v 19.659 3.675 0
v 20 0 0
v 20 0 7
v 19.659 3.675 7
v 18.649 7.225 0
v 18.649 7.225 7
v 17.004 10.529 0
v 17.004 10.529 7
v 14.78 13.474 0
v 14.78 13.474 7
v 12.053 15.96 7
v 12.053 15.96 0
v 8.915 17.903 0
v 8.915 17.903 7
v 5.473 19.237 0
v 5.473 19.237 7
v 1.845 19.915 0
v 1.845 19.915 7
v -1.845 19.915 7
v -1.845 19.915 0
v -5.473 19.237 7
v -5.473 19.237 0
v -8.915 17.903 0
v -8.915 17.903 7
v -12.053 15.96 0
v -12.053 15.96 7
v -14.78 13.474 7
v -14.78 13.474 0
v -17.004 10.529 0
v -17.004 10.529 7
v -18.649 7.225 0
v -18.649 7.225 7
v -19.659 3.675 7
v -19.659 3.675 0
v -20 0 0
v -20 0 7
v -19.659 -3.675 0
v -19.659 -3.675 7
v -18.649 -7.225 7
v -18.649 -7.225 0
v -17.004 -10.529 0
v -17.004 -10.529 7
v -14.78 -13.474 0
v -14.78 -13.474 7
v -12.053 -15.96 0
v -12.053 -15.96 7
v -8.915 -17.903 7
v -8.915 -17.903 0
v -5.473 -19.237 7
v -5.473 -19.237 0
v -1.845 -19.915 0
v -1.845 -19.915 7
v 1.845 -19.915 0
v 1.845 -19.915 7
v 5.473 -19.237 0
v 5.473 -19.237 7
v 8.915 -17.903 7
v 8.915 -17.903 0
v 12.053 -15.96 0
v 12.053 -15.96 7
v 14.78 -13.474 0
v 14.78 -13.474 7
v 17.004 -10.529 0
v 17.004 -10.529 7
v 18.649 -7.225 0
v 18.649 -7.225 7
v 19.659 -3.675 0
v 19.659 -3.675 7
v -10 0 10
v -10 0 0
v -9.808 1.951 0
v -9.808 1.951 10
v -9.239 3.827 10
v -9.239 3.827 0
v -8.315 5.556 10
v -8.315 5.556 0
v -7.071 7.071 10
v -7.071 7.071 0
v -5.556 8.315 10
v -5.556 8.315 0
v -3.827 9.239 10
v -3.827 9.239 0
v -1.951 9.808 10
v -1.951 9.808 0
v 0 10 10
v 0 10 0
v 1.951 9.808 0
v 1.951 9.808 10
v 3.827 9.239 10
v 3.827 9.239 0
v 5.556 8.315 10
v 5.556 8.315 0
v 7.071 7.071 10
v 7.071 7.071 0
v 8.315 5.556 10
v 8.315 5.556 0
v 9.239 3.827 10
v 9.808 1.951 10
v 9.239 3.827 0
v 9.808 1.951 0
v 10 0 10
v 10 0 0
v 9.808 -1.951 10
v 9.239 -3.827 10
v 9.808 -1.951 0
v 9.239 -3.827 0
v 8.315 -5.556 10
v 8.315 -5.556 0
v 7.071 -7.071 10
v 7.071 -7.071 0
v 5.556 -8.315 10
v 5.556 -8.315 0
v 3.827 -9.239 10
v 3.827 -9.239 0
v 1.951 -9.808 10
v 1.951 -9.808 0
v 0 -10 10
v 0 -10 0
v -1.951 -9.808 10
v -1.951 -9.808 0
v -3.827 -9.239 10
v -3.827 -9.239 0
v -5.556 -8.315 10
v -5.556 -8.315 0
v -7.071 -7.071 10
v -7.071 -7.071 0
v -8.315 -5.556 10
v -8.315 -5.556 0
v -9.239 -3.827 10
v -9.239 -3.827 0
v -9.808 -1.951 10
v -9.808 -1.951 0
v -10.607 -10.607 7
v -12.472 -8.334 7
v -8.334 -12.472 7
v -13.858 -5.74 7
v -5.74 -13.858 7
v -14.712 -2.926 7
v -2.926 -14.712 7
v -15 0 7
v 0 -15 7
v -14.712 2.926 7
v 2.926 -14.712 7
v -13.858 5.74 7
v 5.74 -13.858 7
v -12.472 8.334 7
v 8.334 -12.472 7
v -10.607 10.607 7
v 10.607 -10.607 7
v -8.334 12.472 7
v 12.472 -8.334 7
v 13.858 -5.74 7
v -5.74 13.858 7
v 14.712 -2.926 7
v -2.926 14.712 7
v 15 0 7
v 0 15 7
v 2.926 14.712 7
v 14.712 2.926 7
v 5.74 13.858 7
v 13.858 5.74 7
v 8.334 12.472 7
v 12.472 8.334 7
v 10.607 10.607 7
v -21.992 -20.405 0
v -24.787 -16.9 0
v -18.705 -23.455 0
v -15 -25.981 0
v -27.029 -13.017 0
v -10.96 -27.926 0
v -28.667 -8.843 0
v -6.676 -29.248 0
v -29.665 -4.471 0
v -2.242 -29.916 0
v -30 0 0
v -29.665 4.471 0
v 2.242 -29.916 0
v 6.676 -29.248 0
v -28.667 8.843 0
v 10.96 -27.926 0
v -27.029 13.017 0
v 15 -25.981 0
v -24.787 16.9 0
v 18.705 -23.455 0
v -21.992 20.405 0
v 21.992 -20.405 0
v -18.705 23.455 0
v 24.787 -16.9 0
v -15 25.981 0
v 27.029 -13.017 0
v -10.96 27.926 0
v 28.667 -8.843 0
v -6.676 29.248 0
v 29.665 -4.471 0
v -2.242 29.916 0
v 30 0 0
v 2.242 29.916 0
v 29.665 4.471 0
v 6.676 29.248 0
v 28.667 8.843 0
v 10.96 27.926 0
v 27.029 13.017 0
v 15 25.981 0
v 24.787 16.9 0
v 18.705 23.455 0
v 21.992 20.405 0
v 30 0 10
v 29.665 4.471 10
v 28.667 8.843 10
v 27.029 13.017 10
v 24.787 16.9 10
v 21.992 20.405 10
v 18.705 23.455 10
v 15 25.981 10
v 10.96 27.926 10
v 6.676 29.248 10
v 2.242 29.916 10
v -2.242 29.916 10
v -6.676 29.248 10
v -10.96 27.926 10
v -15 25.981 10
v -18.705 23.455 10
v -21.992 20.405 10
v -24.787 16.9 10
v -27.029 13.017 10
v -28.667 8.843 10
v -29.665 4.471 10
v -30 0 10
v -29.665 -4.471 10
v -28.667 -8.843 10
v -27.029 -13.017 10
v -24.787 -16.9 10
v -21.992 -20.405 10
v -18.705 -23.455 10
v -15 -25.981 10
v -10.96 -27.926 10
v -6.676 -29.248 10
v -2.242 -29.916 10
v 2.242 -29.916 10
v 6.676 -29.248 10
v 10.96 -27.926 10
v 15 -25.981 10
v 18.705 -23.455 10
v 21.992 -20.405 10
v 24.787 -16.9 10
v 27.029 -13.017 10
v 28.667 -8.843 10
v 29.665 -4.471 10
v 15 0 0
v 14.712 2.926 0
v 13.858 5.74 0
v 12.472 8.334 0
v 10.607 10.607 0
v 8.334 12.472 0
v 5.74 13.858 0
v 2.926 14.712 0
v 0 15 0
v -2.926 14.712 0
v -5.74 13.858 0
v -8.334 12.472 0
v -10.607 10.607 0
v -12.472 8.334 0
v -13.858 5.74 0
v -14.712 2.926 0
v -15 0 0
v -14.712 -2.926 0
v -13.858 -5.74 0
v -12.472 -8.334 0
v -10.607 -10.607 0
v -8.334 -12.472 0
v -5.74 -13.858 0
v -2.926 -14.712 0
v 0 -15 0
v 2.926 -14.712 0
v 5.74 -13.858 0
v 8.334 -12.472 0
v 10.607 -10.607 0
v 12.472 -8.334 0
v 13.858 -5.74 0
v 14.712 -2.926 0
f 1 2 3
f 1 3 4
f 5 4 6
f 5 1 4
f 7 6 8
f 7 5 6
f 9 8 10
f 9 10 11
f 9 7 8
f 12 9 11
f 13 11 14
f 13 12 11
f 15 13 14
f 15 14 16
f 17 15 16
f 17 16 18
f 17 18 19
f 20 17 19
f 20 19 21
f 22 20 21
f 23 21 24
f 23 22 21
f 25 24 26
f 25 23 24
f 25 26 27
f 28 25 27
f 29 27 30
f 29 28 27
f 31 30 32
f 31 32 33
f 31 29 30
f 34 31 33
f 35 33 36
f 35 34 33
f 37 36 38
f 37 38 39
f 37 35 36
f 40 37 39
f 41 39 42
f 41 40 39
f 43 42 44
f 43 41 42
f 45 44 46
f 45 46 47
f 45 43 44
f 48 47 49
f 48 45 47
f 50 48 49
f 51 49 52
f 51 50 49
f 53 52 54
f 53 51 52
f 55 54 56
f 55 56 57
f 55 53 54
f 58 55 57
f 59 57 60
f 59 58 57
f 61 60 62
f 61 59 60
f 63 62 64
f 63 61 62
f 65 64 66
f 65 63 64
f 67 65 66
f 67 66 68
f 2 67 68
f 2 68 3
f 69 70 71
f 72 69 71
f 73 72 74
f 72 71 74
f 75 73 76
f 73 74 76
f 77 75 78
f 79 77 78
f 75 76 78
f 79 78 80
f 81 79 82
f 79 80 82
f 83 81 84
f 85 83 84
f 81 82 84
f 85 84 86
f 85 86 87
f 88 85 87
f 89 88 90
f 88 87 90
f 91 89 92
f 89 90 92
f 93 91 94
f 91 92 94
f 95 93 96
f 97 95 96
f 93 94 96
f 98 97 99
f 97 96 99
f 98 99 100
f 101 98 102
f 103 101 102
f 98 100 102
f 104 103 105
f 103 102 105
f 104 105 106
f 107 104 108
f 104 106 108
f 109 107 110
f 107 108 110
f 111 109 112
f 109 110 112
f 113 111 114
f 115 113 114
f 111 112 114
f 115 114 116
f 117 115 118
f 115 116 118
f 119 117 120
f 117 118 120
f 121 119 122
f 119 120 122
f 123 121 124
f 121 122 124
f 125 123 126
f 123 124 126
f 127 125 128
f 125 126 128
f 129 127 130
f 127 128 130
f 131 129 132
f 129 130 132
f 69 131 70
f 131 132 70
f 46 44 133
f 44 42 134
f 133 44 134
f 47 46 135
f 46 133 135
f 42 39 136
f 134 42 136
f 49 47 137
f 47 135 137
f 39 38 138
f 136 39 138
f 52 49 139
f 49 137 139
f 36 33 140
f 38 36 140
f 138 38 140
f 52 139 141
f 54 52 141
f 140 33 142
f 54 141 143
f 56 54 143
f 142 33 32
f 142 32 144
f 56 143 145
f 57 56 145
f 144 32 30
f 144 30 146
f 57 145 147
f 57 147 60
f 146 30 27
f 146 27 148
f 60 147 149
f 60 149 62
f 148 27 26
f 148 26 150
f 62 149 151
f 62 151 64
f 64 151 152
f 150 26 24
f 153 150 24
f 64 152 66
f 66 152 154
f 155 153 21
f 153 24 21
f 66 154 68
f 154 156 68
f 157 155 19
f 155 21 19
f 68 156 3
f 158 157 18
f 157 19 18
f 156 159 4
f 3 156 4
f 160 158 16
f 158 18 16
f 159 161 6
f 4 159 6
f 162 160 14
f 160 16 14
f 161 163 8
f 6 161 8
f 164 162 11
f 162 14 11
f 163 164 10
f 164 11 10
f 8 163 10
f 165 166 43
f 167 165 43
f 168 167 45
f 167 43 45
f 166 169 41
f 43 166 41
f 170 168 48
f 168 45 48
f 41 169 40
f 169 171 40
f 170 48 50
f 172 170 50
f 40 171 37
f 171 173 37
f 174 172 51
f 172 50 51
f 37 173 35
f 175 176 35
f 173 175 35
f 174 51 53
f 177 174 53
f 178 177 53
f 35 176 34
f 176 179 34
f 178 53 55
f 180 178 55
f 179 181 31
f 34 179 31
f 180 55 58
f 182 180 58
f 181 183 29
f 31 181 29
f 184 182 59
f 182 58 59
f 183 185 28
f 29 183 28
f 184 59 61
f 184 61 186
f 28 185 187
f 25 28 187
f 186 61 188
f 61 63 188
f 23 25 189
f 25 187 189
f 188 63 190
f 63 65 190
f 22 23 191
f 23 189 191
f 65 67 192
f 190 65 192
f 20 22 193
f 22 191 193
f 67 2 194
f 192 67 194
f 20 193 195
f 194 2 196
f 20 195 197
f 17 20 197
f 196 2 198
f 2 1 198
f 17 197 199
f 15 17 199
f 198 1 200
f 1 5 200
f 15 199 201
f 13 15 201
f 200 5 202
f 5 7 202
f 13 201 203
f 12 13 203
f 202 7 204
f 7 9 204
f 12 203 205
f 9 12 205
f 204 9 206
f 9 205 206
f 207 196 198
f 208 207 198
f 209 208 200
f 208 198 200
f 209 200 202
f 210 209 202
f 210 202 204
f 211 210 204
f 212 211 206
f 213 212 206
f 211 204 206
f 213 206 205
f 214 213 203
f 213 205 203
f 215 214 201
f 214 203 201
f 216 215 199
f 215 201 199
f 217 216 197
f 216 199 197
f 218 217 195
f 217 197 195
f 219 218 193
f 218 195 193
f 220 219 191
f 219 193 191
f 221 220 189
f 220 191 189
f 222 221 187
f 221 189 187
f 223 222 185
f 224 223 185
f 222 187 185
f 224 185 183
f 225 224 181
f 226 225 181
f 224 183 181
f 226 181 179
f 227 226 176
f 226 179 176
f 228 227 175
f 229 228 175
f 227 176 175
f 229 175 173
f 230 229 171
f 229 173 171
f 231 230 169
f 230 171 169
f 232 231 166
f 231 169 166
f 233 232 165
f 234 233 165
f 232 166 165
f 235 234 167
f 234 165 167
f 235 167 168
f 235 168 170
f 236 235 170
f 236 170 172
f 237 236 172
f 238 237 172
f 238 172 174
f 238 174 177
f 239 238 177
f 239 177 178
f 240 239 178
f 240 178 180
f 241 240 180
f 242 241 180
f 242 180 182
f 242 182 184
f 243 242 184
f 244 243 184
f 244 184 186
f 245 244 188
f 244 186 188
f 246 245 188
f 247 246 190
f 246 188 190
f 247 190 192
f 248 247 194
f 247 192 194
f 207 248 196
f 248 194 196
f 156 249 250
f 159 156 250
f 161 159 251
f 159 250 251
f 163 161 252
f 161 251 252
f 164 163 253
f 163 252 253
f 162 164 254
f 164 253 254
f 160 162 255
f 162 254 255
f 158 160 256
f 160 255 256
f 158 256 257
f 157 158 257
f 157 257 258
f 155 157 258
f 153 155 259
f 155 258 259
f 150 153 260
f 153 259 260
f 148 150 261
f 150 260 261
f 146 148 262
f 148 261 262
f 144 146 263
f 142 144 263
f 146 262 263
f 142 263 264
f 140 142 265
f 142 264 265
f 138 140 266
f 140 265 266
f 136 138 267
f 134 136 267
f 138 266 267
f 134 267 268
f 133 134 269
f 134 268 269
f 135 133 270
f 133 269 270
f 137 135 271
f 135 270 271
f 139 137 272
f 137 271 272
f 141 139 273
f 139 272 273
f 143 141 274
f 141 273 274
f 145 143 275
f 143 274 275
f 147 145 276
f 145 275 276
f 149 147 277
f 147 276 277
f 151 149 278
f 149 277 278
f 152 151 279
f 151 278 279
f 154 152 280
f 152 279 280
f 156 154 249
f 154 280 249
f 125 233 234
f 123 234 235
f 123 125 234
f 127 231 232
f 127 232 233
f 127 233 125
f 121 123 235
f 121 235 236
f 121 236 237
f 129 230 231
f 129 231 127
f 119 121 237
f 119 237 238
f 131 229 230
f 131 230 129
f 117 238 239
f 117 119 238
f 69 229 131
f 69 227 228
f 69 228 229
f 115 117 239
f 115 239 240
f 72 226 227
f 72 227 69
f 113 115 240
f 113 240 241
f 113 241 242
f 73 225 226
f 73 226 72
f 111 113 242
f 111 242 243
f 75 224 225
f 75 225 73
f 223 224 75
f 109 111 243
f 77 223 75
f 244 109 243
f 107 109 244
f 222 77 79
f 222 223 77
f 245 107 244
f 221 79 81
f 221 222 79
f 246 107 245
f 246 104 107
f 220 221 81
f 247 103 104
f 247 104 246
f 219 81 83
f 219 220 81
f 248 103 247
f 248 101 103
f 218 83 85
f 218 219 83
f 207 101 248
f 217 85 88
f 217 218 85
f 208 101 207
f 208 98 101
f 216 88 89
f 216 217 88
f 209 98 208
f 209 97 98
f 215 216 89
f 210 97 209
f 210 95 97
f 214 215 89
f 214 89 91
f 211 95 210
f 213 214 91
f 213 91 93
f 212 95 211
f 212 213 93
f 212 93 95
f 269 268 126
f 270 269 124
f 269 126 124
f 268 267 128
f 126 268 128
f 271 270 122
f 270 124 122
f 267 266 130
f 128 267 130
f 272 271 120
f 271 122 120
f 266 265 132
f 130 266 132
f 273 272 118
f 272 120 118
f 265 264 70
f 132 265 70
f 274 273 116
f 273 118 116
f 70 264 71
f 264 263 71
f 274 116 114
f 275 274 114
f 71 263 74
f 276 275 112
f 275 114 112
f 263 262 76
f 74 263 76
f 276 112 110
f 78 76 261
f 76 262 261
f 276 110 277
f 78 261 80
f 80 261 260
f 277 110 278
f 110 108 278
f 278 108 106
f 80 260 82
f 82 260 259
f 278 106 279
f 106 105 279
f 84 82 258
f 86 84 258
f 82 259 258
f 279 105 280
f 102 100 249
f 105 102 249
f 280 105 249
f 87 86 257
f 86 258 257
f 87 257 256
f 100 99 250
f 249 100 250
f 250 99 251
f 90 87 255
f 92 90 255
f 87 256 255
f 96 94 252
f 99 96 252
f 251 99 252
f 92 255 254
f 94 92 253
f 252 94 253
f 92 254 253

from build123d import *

# Parameters (mm, degrees)
SKETCH_1_R          = 30
EXTRUDE_1_DEPTH     = 10
SKETCH_2_R          = 20
SKETCH_2_R_2        = 15
CUT_EXTRUDE_1_DEPTH = 7
SKETCH_3_R          = 10
CUT_EXTRUDE_2_DEPTH = 10


with BuildPart() as part:
    # 草图1 → 凸台-拉伸1 (new body)
    with BuildSketch(Plane.XY):
        Circle(SKETCH_1_R)
    extrude(amount=EXTRUDE_1_DEPTH)

    # 草图2 → 切除-拉伸1 (cut)
    with BuildSketch(Plane.XY):
        Circle(SKETCH_2_R)
        Circle(SKETCH_2_R_2, mode=Mode.SUBTRACT)
    extrude(amount=CUT_EXTRUDE_1_DEPTH, mode=Mode.SUBTRACT)

    # 草图3 → 切除-拉伸2 (cut)
    with BuildSketch(Plane(origin=(0, 0, 0), x_dir=(-1, 0, 0), z_dir=(0, 0, -1))):
        Circle(SKETCH_3_R)
    extrude(amount=-CUT_EXTRUDE_2_DEPTH, mode=Mode.SUBTRACT)


solid = part.part
